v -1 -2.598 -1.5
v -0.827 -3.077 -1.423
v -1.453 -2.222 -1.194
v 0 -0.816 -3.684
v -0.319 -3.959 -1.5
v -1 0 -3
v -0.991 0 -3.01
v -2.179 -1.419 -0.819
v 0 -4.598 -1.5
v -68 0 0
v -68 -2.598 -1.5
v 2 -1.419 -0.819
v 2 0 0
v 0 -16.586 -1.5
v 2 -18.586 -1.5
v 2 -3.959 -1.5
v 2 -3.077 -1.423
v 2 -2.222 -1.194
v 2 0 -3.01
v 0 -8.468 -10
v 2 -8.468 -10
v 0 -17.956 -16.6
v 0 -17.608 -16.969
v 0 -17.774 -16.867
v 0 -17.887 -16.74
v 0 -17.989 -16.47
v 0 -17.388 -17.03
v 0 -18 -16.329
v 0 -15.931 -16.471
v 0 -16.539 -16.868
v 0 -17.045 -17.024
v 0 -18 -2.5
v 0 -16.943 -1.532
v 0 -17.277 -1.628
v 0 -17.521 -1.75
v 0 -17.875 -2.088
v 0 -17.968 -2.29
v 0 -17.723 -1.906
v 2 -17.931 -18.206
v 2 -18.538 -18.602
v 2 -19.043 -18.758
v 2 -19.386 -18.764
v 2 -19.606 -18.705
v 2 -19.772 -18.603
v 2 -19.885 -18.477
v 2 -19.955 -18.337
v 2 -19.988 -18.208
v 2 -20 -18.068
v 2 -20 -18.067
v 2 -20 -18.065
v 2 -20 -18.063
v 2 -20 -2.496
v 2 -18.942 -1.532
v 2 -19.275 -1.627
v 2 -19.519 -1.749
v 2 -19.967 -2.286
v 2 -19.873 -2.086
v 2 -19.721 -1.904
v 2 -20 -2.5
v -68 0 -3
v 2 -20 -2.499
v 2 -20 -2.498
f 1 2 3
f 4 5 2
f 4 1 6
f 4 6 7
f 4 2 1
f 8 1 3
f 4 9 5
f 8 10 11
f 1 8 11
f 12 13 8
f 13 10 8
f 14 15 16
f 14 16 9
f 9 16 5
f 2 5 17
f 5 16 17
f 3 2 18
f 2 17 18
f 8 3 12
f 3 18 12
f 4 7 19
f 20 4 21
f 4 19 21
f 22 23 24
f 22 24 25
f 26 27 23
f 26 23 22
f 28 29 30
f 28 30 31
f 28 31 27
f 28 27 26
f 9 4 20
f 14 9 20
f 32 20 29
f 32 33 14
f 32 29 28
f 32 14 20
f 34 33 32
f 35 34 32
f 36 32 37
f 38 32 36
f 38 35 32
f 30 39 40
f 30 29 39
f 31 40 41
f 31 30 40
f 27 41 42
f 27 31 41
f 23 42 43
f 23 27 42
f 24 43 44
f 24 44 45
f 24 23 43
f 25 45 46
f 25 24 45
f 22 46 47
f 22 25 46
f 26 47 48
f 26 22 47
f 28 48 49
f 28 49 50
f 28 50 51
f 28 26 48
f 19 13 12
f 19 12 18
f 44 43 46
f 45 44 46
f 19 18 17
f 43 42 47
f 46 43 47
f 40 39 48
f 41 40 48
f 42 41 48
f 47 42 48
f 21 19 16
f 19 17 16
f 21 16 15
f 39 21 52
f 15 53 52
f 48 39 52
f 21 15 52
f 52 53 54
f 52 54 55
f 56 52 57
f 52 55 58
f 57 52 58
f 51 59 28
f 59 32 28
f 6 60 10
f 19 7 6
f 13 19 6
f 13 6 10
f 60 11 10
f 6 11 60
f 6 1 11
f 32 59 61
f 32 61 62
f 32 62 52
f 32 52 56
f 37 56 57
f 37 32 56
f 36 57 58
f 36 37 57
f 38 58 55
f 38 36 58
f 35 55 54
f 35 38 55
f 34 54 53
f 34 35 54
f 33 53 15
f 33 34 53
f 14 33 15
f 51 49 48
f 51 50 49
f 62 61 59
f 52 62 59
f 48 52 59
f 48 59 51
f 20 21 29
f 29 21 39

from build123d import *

# Parameters (mm, degrees)
F0_W      = 10
F0_H      = 10
F1_DEPTH  = 2
F3_DEPTH  = 60
F5_DEPTH  = 2
F7_DEPTH  = 2
F9_SIZE   = 1
F10_R     = 5.08
F11_DEPTH = 2.9920059478
F12_DEPTH = 10
F13_DEPTH = 10
F14_DEPTH = 10
F16_DEPTH = 2
F17_SIZE  = 1.99999
F18_R     = 1


# Not quite as in the source:
# - a fillet or chamfer is up to 0.001 mm smaller than in the source, because OpenCascade refuses the exact size


with BuildPart() as f1:
    # F0 (on Right) → F1 (new body)
    with BuildSketch(Plane.YZ):
        with Locations((-5, -5)):
            Rectangle(F0_W, F0_H)
    extrude(amount=F1_DEPTH)

    # F2 (on face) → F3 (join)
    with BuildSketch(Plane.YZ.offset(2)):
        Polygon((0, -3), (0, 0), (-2.5980762114, -1.5), align=None)
    extrude(amount=-F3_DEPTH)

    # F4 (on face) → F5 (cut, through all)
    with BuildSketch(Plane(origin=(0, 0, 0), x_dir=(0, -1, 0), z_dir=(-1, 0, 0))):
        Polygon((10, 0), (0, 0), (2.5980762114, -1.5), align=None)
    extrude(amount=-F5_DEPTH, mode=Mode.SUBTRACT)

    # F6 (on face) → F7 (cut, through all)
    with BuildSketch(Plane.YZ.offset(2)):
        Polygon((-10, -1.5), (-2.5980762114, -1.5), (-10, 0), align=None)
    extrude(amount=-F7_DEPTH, mode=Mode.SUBTRACT)

    # F9
    f9_edges = [f1.edges().sort_by_distance(p)[0] for p in [
        (0, -1.299038, -2.25),
    ]]
    chamfer(f9_edges, length=F9_SIZE)

    # F10
    f10_edges = [f1.edges().sort_by_distance(p)[0] for p in [
        (1, -2.598076, -1.5),
    ]]
    fillet(f10_edges, radius=F10_R)

    # F8 (on face) → F11 (cut, through all)
    with BuildSketch(Plane.YZ.offset(2)):
        Polygon((0, -10), (0, -3.0103854369), (-8.4680961445, -10), align=None)
    extrude(amount=-F11_DEPTH, mode=Mode.SUBTRACT)

    # F12 (add): a face of the model
    f12_faces = [f1.faces().sort_by_distance(p)[0] for p in [
        (-58, -0.8660254038, -1.5),
    ]]
    extrude(f12_faces, amount=F12_DEPTH)

    # F13 (add): a face of the model
    f13_faces = [f1.faces().sort_by_distance(p)[0] for p in [
        (1, -10, -5.75),
    ]]
    extrude(f13_faces, amount=F13_DEPTH)

    # F14 (add): a face of the model
    f14_faces = [f1.faces().sort_by_distance(p)[0] for p in [
        (1, -14.2340480722, -10),
    ]]
    extrude(f14_faces, amount=F14_DEPTH)

    # F15 (on face) → F16 (cut, through all)
    with BuildSketch(Plane.YZ.offset(2)):
        Polygon((-8.4680961445, -20), (-8.4680961445, -10), (-20, -20), align=None)
    extrude(amount=-F16_DEPTH, mode=Mode.SUBTRACT)

    # F17 (size 2 in the source; OpenCascade refuses exactly that, so slightly less here)
    f17_edges = [f1.edges().sort_by_distance(p)[0] for p in [
        (0, -20, -10.75),
    ]]
    chamfer(f17_edges, length=F17_SIZE)

    # F18
    f18_edges = [f1.edges().sort_by_distance(p)[0] for p in [
        (0.999995, -19.000005, -1.5),
        (0.999995, -19.000005, -19.132845),
    ]]
    fillet(f18_edges, radius=F18_R)


solid = f1.part
